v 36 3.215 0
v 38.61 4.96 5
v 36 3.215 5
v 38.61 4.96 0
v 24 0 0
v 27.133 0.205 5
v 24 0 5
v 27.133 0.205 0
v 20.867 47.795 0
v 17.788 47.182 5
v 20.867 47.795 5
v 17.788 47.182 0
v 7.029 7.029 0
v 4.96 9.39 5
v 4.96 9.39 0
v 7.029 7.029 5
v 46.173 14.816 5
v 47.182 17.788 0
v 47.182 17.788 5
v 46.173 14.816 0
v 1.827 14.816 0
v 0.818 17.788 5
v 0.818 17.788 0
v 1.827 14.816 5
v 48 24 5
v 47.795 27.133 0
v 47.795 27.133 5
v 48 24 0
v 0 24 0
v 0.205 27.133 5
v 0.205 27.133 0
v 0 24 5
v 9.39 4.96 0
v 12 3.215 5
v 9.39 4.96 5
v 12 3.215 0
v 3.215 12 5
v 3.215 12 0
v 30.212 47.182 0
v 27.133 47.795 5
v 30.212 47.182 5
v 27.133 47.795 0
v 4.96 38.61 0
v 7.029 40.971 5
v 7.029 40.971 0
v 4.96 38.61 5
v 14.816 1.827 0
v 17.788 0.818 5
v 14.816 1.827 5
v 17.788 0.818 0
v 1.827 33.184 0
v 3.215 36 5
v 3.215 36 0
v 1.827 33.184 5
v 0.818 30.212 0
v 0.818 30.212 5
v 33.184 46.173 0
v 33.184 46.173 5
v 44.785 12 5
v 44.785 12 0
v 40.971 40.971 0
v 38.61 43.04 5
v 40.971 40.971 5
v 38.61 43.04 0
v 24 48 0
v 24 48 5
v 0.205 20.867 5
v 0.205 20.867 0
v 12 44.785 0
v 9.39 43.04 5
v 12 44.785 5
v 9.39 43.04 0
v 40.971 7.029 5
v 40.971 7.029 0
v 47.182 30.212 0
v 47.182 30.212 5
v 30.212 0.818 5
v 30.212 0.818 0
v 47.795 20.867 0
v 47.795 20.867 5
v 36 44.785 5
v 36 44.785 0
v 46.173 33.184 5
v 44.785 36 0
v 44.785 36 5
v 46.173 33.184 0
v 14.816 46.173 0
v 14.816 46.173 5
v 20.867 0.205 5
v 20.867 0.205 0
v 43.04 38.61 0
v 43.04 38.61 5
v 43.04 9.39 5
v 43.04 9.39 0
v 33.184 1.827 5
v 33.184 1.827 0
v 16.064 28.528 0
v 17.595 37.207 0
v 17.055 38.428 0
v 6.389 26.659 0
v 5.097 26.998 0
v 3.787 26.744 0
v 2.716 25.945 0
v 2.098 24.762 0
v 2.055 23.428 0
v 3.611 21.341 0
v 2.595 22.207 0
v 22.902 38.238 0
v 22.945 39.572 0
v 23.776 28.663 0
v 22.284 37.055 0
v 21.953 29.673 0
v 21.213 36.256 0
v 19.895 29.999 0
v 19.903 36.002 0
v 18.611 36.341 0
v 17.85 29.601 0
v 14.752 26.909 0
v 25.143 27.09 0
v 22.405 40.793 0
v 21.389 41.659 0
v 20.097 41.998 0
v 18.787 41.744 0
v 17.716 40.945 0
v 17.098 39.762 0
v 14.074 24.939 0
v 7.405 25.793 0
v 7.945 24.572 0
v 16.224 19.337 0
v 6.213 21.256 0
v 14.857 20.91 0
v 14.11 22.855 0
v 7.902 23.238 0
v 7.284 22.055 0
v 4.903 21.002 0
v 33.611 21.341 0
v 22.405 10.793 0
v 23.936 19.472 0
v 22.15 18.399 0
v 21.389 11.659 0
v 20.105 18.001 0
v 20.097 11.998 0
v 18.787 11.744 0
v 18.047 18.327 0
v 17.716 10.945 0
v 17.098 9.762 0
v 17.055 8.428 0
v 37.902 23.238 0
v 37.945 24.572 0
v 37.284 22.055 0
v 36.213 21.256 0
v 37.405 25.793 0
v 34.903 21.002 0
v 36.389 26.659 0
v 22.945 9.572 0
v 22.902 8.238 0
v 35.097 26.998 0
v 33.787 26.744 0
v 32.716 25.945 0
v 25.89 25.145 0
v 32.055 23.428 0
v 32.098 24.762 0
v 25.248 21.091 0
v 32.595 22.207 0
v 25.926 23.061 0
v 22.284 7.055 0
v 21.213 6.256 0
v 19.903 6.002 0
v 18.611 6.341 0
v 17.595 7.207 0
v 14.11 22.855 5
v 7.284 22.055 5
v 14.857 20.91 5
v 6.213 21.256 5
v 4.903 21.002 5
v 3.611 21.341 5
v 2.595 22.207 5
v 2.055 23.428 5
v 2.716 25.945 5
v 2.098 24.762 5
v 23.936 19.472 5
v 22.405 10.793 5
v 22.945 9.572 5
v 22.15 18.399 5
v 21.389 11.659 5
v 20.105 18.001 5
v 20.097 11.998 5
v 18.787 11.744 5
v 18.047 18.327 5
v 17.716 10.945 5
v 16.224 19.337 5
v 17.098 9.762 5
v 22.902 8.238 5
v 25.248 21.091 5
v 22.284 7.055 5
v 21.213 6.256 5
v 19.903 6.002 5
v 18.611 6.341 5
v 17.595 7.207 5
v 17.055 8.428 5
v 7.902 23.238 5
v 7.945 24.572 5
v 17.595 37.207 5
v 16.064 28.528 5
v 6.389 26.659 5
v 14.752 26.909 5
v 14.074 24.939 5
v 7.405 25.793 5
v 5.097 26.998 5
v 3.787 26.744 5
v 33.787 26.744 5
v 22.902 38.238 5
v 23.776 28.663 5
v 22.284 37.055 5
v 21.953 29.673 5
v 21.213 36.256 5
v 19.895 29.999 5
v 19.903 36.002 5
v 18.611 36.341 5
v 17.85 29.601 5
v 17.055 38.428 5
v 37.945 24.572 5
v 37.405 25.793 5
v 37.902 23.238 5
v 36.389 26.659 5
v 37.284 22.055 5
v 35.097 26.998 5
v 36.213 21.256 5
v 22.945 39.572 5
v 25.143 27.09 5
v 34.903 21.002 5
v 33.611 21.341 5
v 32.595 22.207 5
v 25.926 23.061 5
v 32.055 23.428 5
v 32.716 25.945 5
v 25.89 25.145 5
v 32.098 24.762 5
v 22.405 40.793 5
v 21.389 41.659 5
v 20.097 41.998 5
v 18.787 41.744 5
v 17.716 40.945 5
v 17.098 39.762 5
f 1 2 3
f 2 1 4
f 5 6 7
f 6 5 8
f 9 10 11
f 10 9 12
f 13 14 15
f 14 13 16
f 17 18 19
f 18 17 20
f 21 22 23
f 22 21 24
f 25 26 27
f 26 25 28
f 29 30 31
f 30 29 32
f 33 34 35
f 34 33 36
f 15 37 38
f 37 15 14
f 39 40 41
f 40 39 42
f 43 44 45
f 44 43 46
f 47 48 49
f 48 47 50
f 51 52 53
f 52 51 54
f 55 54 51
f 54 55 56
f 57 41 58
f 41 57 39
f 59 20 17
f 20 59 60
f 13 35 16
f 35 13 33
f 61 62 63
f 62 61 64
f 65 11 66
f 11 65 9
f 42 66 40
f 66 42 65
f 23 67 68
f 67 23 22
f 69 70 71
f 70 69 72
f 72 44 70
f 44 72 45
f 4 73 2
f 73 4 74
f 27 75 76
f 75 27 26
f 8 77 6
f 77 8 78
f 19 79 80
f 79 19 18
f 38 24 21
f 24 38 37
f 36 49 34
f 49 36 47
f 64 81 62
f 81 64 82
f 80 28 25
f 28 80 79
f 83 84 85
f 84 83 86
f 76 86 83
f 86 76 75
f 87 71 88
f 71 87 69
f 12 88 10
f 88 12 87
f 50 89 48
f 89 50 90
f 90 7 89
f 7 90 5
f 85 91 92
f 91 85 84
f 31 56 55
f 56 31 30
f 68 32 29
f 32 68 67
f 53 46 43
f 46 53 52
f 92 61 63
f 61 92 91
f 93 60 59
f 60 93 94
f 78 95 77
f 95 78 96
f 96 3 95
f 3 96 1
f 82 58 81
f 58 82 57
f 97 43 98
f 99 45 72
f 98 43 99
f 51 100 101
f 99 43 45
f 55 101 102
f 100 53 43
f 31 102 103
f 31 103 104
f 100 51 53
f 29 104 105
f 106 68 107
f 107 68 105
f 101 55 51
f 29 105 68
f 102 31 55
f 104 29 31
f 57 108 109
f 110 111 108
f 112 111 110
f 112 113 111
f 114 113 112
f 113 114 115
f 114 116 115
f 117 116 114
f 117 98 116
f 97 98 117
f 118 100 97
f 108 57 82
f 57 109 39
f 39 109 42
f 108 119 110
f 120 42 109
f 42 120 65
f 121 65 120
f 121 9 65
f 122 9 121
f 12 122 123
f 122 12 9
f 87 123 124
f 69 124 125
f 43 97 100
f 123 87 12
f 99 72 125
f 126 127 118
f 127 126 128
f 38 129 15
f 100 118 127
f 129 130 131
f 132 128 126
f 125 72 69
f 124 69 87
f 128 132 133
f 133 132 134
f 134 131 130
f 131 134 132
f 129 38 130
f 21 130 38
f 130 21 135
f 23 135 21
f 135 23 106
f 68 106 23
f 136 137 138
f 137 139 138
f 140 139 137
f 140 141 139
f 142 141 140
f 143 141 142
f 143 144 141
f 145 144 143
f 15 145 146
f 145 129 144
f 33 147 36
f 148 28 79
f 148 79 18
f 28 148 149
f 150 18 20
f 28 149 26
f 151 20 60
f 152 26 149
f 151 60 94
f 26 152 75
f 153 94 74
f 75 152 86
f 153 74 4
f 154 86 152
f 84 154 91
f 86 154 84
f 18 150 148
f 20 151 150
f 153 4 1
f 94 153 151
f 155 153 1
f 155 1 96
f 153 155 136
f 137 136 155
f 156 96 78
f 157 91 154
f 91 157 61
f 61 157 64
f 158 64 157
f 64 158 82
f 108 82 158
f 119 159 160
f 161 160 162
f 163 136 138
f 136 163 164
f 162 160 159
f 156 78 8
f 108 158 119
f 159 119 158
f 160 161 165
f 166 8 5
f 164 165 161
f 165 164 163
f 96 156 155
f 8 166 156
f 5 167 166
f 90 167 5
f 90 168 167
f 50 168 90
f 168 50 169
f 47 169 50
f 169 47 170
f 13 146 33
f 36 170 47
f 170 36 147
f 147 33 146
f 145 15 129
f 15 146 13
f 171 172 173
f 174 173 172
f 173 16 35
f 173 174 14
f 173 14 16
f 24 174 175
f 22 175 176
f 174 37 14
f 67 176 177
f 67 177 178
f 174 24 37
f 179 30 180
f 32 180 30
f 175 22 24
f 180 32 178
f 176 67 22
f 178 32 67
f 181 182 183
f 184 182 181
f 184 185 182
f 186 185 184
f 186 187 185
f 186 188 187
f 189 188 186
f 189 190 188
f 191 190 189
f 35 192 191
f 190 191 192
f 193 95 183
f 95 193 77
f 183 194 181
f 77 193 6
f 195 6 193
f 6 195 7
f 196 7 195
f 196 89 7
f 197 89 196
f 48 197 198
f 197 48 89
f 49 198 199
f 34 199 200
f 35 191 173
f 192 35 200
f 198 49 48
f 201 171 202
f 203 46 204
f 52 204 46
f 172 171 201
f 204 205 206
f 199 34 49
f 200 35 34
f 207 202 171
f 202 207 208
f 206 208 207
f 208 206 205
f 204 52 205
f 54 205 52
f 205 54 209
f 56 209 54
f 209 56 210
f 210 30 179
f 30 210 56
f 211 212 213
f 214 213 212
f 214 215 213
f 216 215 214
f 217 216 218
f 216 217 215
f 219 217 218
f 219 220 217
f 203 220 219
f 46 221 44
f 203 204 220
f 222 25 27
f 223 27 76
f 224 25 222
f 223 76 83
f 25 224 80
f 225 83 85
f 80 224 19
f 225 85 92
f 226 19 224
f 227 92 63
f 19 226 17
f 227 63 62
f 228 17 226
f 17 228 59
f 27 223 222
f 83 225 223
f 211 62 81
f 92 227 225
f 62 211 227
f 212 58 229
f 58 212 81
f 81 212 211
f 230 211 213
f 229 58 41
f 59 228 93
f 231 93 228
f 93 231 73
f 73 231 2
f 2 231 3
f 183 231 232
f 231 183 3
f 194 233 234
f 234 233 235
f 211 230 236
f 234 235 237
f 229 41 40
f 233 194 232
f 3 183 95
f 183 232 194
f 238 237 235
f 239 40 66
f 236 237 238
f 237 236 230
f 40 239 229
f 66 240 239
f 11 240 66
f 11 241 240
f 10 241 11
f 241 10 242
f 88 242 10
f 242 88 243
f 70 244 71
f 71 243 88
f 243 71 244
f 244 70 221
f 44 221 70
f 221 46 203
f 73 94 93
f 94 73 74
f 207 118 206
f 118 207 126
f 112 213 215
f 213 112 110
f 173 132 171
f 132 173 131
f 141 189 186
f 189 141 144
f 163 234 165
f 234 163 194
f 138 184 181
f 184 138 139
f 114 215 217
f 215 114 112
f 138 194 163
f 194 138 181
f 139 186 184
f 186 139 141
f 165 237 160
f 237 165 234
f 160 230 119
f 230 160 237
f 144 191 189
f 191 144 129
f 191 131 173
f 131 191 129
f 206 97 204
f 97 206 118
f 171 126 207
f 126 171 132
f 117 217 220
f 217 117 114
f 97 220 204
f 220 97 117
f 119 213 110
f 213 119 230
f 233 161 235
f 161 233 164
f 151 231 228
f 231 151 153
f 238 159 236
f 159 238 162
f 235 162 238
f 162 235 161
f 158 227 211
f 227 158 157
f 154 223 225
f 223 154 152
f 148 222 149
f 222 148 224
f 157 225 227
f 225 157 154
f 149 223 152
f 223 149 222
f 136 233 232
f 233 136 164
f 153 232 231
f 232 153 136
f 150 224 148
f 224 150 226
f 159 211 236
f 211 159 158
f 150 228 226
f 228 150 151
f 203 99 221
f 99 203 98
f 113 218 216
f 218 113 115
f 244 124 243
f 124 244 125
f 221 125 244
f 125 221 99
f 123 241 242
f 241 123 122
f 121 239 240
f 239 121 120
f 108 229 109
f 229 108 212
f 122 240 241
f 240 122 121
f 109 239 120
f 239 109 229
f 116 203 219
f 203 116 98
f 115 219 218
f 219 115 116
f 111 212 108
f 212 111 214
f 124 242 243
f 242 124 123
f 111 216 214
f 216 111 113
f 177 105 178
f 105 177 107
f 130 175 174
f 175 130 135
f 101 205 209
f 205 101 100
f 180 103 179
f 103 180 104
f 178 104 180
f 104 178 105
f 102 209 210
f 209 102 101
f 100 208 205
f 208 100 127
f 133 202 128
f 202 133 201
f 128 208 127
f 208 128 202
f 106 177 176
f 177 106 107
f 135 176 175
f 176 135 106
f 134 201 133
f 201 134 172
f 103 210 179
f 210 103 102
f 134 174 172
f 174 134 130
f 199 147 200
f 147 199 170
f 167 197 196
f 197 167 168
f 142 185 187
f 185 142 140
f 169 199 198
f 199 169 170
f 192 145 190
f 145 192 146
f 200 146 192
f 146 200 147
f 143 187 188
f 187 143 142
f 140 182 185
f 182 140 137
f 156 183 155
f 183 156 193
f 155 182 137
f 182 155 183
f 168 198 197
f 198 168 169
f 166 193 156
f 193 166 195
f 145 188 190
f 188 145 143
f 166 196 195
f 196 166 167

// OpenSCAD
$fn = 32;

// ----------------------------------------------------------------------
// Cam plate: eccentric cam, base R24
// ----------------------------------------------------------------------

// --- parameters (mm) ---
base_r = 24;              // base circle radius
lobe_h = 12;              // cam lobe rise
bore_r = 6;               // shaft bore radius
plate_t = 5;              // plate thickness, Z (extrusion height)
ecc = 4;                  // disc eccentricity
ring_r = 15;              // lightening ring radius
bolt_r = 3;               // lightening hole radius
fit_tol = 0.05;           // declared fit tolerance (prompt contract)
free_tol = 0.3;           // declared free tolerance (prompt contract)

profile = [[48, 24], [47.795, 27.133], [47.182, 30.212], [46.173, 33.184], [44.785, 36], [43.04, 38.61], [40.971, 40.971], [38.61, 43.04], [36, 44.785], [33.184, 46.173], [30.212, 47.182], [27.133, 47.795], [24, 48], [20.867, 47.795], [17.788, 47.182], [14.816, 46.173], [12, 44.785], [9.39, 43.04], [7.029, 40.971], [4.96, 38.61], [3.215, 36], [1.827, 33.184], [0.818, 30.212], [0.205, 27.133], [0, 24], [0.205, 20.867], [0.818, 17.788], [1.827, 14.816], [3.215, 12], [4.96, 9.39], [7.029, 7.029], [9.39, 4.96], [12, 3.215], [14.816, 1.827], [17.788, 0.818], [20.867, 0.205], [24, 0], [27.133, 0.205], [30.212, 0.818], [33.184, 1.827], [36, 3.215], [38.61, 4.96], [40.971, 7.029], [43.04, 9.39], [44.785, 12], [46.173, 14.816], [47.182, 17.788], [47.795, 20.867]];  // primary outline, 48 points, counter clockwise
void_1 = [[25.89, 25.145], [25.143, 27.09], [23.776, 28.663], [21.953, 29.673], [19.895, 29.999], [17.85, 29.601], [16.064, 28.528], [14.752, 26.909], [14.074, 24.939], [14.11, 22.855], [14.857, 20.91], [16.224, 19.337], [18.047, 18.327], [20.105, 18.001], [22.15, 18.399], [23.936, 19.472], [25.248, 21.091], [25.926, 23.061]];  // shaft bore, 18 points
void_2 = [[37.945, 24.572], [37.405, 25.793], [36.389, 26.659], [35.097, 26.998], [33.787, 26.744], [32.716, 25.945], [32.098, 24.762], [32.055, 23.428], [32.595, 22.207], [33.611, 21.341], [34.903, 21.002], [36.213, 21.256], [37.284, 22.055], [37.902, 23.238]];  // lightening hole 1, 14 points
void_3 = [[22.945, 39.572], [22.405, 40.793], [21.389, 41.659], [20.097, 41.998], [18.787, 41.744], [17.716, 40.945], [17.098, 39.762], [17.055, 38.428], [17.595, 37.207], [18.611, 36.341], [19.903, 36.002], [21.213, 36.256], [22.284, 37.055], [22.902, 38.238]];  // lightening hole 2, 14 points
void_4 = [[7.945, 24.572], [7.405, 25.793], [6.389, 26.659], [5.097, 26.998], [3.787, 26.744], [2.716, 25.945], [2.098, 24.762], [2.055, 23.428], [2.595, 22.207], [3.611, 21.341], [4.903, 21.002], [6.213, 21.256], [7.284, 22.055], [7.902, 23.238]];  // lightening hole 3, 14 points
void_5 = [[22.945, 9.572], [22.405, 10.793], [21.389, 11.659], [20.097, 11.998], [18.787, 11.744], [17.716, 10.945], [17.098, 9.762], [17.055, 8.428], [17.595, 7.207], [18.611, 6.341], [19.903, 6.002], [21.213, 6.256], [22.284, 7.055], [22.902, 8.238]];  // lightening hole 4, 14 points

// --- the one profile operation ---
difference() {
  linear_extrude(height = plate_t) polygon(points = profile);
  translate([0, 0, -1])
    linear_extrude(height = plate_t + 2) polygon(points = void_1);
  translate([0, 0, -1])
    linear_extrude(height = plate_t + 2) polygon(points = void_2);
  translate([0, 0, -1])
    linear_extrude(height = plate_t + 2) polygon(points = void_3);
  translate([0, 0, -1])
    linear_extrude(height = plate_t + 2) polygon(points = void_4);
  translate([0, 0, -1])
    linear_extrude(height = plate_t + 2) polygon(points = void_5);
}
